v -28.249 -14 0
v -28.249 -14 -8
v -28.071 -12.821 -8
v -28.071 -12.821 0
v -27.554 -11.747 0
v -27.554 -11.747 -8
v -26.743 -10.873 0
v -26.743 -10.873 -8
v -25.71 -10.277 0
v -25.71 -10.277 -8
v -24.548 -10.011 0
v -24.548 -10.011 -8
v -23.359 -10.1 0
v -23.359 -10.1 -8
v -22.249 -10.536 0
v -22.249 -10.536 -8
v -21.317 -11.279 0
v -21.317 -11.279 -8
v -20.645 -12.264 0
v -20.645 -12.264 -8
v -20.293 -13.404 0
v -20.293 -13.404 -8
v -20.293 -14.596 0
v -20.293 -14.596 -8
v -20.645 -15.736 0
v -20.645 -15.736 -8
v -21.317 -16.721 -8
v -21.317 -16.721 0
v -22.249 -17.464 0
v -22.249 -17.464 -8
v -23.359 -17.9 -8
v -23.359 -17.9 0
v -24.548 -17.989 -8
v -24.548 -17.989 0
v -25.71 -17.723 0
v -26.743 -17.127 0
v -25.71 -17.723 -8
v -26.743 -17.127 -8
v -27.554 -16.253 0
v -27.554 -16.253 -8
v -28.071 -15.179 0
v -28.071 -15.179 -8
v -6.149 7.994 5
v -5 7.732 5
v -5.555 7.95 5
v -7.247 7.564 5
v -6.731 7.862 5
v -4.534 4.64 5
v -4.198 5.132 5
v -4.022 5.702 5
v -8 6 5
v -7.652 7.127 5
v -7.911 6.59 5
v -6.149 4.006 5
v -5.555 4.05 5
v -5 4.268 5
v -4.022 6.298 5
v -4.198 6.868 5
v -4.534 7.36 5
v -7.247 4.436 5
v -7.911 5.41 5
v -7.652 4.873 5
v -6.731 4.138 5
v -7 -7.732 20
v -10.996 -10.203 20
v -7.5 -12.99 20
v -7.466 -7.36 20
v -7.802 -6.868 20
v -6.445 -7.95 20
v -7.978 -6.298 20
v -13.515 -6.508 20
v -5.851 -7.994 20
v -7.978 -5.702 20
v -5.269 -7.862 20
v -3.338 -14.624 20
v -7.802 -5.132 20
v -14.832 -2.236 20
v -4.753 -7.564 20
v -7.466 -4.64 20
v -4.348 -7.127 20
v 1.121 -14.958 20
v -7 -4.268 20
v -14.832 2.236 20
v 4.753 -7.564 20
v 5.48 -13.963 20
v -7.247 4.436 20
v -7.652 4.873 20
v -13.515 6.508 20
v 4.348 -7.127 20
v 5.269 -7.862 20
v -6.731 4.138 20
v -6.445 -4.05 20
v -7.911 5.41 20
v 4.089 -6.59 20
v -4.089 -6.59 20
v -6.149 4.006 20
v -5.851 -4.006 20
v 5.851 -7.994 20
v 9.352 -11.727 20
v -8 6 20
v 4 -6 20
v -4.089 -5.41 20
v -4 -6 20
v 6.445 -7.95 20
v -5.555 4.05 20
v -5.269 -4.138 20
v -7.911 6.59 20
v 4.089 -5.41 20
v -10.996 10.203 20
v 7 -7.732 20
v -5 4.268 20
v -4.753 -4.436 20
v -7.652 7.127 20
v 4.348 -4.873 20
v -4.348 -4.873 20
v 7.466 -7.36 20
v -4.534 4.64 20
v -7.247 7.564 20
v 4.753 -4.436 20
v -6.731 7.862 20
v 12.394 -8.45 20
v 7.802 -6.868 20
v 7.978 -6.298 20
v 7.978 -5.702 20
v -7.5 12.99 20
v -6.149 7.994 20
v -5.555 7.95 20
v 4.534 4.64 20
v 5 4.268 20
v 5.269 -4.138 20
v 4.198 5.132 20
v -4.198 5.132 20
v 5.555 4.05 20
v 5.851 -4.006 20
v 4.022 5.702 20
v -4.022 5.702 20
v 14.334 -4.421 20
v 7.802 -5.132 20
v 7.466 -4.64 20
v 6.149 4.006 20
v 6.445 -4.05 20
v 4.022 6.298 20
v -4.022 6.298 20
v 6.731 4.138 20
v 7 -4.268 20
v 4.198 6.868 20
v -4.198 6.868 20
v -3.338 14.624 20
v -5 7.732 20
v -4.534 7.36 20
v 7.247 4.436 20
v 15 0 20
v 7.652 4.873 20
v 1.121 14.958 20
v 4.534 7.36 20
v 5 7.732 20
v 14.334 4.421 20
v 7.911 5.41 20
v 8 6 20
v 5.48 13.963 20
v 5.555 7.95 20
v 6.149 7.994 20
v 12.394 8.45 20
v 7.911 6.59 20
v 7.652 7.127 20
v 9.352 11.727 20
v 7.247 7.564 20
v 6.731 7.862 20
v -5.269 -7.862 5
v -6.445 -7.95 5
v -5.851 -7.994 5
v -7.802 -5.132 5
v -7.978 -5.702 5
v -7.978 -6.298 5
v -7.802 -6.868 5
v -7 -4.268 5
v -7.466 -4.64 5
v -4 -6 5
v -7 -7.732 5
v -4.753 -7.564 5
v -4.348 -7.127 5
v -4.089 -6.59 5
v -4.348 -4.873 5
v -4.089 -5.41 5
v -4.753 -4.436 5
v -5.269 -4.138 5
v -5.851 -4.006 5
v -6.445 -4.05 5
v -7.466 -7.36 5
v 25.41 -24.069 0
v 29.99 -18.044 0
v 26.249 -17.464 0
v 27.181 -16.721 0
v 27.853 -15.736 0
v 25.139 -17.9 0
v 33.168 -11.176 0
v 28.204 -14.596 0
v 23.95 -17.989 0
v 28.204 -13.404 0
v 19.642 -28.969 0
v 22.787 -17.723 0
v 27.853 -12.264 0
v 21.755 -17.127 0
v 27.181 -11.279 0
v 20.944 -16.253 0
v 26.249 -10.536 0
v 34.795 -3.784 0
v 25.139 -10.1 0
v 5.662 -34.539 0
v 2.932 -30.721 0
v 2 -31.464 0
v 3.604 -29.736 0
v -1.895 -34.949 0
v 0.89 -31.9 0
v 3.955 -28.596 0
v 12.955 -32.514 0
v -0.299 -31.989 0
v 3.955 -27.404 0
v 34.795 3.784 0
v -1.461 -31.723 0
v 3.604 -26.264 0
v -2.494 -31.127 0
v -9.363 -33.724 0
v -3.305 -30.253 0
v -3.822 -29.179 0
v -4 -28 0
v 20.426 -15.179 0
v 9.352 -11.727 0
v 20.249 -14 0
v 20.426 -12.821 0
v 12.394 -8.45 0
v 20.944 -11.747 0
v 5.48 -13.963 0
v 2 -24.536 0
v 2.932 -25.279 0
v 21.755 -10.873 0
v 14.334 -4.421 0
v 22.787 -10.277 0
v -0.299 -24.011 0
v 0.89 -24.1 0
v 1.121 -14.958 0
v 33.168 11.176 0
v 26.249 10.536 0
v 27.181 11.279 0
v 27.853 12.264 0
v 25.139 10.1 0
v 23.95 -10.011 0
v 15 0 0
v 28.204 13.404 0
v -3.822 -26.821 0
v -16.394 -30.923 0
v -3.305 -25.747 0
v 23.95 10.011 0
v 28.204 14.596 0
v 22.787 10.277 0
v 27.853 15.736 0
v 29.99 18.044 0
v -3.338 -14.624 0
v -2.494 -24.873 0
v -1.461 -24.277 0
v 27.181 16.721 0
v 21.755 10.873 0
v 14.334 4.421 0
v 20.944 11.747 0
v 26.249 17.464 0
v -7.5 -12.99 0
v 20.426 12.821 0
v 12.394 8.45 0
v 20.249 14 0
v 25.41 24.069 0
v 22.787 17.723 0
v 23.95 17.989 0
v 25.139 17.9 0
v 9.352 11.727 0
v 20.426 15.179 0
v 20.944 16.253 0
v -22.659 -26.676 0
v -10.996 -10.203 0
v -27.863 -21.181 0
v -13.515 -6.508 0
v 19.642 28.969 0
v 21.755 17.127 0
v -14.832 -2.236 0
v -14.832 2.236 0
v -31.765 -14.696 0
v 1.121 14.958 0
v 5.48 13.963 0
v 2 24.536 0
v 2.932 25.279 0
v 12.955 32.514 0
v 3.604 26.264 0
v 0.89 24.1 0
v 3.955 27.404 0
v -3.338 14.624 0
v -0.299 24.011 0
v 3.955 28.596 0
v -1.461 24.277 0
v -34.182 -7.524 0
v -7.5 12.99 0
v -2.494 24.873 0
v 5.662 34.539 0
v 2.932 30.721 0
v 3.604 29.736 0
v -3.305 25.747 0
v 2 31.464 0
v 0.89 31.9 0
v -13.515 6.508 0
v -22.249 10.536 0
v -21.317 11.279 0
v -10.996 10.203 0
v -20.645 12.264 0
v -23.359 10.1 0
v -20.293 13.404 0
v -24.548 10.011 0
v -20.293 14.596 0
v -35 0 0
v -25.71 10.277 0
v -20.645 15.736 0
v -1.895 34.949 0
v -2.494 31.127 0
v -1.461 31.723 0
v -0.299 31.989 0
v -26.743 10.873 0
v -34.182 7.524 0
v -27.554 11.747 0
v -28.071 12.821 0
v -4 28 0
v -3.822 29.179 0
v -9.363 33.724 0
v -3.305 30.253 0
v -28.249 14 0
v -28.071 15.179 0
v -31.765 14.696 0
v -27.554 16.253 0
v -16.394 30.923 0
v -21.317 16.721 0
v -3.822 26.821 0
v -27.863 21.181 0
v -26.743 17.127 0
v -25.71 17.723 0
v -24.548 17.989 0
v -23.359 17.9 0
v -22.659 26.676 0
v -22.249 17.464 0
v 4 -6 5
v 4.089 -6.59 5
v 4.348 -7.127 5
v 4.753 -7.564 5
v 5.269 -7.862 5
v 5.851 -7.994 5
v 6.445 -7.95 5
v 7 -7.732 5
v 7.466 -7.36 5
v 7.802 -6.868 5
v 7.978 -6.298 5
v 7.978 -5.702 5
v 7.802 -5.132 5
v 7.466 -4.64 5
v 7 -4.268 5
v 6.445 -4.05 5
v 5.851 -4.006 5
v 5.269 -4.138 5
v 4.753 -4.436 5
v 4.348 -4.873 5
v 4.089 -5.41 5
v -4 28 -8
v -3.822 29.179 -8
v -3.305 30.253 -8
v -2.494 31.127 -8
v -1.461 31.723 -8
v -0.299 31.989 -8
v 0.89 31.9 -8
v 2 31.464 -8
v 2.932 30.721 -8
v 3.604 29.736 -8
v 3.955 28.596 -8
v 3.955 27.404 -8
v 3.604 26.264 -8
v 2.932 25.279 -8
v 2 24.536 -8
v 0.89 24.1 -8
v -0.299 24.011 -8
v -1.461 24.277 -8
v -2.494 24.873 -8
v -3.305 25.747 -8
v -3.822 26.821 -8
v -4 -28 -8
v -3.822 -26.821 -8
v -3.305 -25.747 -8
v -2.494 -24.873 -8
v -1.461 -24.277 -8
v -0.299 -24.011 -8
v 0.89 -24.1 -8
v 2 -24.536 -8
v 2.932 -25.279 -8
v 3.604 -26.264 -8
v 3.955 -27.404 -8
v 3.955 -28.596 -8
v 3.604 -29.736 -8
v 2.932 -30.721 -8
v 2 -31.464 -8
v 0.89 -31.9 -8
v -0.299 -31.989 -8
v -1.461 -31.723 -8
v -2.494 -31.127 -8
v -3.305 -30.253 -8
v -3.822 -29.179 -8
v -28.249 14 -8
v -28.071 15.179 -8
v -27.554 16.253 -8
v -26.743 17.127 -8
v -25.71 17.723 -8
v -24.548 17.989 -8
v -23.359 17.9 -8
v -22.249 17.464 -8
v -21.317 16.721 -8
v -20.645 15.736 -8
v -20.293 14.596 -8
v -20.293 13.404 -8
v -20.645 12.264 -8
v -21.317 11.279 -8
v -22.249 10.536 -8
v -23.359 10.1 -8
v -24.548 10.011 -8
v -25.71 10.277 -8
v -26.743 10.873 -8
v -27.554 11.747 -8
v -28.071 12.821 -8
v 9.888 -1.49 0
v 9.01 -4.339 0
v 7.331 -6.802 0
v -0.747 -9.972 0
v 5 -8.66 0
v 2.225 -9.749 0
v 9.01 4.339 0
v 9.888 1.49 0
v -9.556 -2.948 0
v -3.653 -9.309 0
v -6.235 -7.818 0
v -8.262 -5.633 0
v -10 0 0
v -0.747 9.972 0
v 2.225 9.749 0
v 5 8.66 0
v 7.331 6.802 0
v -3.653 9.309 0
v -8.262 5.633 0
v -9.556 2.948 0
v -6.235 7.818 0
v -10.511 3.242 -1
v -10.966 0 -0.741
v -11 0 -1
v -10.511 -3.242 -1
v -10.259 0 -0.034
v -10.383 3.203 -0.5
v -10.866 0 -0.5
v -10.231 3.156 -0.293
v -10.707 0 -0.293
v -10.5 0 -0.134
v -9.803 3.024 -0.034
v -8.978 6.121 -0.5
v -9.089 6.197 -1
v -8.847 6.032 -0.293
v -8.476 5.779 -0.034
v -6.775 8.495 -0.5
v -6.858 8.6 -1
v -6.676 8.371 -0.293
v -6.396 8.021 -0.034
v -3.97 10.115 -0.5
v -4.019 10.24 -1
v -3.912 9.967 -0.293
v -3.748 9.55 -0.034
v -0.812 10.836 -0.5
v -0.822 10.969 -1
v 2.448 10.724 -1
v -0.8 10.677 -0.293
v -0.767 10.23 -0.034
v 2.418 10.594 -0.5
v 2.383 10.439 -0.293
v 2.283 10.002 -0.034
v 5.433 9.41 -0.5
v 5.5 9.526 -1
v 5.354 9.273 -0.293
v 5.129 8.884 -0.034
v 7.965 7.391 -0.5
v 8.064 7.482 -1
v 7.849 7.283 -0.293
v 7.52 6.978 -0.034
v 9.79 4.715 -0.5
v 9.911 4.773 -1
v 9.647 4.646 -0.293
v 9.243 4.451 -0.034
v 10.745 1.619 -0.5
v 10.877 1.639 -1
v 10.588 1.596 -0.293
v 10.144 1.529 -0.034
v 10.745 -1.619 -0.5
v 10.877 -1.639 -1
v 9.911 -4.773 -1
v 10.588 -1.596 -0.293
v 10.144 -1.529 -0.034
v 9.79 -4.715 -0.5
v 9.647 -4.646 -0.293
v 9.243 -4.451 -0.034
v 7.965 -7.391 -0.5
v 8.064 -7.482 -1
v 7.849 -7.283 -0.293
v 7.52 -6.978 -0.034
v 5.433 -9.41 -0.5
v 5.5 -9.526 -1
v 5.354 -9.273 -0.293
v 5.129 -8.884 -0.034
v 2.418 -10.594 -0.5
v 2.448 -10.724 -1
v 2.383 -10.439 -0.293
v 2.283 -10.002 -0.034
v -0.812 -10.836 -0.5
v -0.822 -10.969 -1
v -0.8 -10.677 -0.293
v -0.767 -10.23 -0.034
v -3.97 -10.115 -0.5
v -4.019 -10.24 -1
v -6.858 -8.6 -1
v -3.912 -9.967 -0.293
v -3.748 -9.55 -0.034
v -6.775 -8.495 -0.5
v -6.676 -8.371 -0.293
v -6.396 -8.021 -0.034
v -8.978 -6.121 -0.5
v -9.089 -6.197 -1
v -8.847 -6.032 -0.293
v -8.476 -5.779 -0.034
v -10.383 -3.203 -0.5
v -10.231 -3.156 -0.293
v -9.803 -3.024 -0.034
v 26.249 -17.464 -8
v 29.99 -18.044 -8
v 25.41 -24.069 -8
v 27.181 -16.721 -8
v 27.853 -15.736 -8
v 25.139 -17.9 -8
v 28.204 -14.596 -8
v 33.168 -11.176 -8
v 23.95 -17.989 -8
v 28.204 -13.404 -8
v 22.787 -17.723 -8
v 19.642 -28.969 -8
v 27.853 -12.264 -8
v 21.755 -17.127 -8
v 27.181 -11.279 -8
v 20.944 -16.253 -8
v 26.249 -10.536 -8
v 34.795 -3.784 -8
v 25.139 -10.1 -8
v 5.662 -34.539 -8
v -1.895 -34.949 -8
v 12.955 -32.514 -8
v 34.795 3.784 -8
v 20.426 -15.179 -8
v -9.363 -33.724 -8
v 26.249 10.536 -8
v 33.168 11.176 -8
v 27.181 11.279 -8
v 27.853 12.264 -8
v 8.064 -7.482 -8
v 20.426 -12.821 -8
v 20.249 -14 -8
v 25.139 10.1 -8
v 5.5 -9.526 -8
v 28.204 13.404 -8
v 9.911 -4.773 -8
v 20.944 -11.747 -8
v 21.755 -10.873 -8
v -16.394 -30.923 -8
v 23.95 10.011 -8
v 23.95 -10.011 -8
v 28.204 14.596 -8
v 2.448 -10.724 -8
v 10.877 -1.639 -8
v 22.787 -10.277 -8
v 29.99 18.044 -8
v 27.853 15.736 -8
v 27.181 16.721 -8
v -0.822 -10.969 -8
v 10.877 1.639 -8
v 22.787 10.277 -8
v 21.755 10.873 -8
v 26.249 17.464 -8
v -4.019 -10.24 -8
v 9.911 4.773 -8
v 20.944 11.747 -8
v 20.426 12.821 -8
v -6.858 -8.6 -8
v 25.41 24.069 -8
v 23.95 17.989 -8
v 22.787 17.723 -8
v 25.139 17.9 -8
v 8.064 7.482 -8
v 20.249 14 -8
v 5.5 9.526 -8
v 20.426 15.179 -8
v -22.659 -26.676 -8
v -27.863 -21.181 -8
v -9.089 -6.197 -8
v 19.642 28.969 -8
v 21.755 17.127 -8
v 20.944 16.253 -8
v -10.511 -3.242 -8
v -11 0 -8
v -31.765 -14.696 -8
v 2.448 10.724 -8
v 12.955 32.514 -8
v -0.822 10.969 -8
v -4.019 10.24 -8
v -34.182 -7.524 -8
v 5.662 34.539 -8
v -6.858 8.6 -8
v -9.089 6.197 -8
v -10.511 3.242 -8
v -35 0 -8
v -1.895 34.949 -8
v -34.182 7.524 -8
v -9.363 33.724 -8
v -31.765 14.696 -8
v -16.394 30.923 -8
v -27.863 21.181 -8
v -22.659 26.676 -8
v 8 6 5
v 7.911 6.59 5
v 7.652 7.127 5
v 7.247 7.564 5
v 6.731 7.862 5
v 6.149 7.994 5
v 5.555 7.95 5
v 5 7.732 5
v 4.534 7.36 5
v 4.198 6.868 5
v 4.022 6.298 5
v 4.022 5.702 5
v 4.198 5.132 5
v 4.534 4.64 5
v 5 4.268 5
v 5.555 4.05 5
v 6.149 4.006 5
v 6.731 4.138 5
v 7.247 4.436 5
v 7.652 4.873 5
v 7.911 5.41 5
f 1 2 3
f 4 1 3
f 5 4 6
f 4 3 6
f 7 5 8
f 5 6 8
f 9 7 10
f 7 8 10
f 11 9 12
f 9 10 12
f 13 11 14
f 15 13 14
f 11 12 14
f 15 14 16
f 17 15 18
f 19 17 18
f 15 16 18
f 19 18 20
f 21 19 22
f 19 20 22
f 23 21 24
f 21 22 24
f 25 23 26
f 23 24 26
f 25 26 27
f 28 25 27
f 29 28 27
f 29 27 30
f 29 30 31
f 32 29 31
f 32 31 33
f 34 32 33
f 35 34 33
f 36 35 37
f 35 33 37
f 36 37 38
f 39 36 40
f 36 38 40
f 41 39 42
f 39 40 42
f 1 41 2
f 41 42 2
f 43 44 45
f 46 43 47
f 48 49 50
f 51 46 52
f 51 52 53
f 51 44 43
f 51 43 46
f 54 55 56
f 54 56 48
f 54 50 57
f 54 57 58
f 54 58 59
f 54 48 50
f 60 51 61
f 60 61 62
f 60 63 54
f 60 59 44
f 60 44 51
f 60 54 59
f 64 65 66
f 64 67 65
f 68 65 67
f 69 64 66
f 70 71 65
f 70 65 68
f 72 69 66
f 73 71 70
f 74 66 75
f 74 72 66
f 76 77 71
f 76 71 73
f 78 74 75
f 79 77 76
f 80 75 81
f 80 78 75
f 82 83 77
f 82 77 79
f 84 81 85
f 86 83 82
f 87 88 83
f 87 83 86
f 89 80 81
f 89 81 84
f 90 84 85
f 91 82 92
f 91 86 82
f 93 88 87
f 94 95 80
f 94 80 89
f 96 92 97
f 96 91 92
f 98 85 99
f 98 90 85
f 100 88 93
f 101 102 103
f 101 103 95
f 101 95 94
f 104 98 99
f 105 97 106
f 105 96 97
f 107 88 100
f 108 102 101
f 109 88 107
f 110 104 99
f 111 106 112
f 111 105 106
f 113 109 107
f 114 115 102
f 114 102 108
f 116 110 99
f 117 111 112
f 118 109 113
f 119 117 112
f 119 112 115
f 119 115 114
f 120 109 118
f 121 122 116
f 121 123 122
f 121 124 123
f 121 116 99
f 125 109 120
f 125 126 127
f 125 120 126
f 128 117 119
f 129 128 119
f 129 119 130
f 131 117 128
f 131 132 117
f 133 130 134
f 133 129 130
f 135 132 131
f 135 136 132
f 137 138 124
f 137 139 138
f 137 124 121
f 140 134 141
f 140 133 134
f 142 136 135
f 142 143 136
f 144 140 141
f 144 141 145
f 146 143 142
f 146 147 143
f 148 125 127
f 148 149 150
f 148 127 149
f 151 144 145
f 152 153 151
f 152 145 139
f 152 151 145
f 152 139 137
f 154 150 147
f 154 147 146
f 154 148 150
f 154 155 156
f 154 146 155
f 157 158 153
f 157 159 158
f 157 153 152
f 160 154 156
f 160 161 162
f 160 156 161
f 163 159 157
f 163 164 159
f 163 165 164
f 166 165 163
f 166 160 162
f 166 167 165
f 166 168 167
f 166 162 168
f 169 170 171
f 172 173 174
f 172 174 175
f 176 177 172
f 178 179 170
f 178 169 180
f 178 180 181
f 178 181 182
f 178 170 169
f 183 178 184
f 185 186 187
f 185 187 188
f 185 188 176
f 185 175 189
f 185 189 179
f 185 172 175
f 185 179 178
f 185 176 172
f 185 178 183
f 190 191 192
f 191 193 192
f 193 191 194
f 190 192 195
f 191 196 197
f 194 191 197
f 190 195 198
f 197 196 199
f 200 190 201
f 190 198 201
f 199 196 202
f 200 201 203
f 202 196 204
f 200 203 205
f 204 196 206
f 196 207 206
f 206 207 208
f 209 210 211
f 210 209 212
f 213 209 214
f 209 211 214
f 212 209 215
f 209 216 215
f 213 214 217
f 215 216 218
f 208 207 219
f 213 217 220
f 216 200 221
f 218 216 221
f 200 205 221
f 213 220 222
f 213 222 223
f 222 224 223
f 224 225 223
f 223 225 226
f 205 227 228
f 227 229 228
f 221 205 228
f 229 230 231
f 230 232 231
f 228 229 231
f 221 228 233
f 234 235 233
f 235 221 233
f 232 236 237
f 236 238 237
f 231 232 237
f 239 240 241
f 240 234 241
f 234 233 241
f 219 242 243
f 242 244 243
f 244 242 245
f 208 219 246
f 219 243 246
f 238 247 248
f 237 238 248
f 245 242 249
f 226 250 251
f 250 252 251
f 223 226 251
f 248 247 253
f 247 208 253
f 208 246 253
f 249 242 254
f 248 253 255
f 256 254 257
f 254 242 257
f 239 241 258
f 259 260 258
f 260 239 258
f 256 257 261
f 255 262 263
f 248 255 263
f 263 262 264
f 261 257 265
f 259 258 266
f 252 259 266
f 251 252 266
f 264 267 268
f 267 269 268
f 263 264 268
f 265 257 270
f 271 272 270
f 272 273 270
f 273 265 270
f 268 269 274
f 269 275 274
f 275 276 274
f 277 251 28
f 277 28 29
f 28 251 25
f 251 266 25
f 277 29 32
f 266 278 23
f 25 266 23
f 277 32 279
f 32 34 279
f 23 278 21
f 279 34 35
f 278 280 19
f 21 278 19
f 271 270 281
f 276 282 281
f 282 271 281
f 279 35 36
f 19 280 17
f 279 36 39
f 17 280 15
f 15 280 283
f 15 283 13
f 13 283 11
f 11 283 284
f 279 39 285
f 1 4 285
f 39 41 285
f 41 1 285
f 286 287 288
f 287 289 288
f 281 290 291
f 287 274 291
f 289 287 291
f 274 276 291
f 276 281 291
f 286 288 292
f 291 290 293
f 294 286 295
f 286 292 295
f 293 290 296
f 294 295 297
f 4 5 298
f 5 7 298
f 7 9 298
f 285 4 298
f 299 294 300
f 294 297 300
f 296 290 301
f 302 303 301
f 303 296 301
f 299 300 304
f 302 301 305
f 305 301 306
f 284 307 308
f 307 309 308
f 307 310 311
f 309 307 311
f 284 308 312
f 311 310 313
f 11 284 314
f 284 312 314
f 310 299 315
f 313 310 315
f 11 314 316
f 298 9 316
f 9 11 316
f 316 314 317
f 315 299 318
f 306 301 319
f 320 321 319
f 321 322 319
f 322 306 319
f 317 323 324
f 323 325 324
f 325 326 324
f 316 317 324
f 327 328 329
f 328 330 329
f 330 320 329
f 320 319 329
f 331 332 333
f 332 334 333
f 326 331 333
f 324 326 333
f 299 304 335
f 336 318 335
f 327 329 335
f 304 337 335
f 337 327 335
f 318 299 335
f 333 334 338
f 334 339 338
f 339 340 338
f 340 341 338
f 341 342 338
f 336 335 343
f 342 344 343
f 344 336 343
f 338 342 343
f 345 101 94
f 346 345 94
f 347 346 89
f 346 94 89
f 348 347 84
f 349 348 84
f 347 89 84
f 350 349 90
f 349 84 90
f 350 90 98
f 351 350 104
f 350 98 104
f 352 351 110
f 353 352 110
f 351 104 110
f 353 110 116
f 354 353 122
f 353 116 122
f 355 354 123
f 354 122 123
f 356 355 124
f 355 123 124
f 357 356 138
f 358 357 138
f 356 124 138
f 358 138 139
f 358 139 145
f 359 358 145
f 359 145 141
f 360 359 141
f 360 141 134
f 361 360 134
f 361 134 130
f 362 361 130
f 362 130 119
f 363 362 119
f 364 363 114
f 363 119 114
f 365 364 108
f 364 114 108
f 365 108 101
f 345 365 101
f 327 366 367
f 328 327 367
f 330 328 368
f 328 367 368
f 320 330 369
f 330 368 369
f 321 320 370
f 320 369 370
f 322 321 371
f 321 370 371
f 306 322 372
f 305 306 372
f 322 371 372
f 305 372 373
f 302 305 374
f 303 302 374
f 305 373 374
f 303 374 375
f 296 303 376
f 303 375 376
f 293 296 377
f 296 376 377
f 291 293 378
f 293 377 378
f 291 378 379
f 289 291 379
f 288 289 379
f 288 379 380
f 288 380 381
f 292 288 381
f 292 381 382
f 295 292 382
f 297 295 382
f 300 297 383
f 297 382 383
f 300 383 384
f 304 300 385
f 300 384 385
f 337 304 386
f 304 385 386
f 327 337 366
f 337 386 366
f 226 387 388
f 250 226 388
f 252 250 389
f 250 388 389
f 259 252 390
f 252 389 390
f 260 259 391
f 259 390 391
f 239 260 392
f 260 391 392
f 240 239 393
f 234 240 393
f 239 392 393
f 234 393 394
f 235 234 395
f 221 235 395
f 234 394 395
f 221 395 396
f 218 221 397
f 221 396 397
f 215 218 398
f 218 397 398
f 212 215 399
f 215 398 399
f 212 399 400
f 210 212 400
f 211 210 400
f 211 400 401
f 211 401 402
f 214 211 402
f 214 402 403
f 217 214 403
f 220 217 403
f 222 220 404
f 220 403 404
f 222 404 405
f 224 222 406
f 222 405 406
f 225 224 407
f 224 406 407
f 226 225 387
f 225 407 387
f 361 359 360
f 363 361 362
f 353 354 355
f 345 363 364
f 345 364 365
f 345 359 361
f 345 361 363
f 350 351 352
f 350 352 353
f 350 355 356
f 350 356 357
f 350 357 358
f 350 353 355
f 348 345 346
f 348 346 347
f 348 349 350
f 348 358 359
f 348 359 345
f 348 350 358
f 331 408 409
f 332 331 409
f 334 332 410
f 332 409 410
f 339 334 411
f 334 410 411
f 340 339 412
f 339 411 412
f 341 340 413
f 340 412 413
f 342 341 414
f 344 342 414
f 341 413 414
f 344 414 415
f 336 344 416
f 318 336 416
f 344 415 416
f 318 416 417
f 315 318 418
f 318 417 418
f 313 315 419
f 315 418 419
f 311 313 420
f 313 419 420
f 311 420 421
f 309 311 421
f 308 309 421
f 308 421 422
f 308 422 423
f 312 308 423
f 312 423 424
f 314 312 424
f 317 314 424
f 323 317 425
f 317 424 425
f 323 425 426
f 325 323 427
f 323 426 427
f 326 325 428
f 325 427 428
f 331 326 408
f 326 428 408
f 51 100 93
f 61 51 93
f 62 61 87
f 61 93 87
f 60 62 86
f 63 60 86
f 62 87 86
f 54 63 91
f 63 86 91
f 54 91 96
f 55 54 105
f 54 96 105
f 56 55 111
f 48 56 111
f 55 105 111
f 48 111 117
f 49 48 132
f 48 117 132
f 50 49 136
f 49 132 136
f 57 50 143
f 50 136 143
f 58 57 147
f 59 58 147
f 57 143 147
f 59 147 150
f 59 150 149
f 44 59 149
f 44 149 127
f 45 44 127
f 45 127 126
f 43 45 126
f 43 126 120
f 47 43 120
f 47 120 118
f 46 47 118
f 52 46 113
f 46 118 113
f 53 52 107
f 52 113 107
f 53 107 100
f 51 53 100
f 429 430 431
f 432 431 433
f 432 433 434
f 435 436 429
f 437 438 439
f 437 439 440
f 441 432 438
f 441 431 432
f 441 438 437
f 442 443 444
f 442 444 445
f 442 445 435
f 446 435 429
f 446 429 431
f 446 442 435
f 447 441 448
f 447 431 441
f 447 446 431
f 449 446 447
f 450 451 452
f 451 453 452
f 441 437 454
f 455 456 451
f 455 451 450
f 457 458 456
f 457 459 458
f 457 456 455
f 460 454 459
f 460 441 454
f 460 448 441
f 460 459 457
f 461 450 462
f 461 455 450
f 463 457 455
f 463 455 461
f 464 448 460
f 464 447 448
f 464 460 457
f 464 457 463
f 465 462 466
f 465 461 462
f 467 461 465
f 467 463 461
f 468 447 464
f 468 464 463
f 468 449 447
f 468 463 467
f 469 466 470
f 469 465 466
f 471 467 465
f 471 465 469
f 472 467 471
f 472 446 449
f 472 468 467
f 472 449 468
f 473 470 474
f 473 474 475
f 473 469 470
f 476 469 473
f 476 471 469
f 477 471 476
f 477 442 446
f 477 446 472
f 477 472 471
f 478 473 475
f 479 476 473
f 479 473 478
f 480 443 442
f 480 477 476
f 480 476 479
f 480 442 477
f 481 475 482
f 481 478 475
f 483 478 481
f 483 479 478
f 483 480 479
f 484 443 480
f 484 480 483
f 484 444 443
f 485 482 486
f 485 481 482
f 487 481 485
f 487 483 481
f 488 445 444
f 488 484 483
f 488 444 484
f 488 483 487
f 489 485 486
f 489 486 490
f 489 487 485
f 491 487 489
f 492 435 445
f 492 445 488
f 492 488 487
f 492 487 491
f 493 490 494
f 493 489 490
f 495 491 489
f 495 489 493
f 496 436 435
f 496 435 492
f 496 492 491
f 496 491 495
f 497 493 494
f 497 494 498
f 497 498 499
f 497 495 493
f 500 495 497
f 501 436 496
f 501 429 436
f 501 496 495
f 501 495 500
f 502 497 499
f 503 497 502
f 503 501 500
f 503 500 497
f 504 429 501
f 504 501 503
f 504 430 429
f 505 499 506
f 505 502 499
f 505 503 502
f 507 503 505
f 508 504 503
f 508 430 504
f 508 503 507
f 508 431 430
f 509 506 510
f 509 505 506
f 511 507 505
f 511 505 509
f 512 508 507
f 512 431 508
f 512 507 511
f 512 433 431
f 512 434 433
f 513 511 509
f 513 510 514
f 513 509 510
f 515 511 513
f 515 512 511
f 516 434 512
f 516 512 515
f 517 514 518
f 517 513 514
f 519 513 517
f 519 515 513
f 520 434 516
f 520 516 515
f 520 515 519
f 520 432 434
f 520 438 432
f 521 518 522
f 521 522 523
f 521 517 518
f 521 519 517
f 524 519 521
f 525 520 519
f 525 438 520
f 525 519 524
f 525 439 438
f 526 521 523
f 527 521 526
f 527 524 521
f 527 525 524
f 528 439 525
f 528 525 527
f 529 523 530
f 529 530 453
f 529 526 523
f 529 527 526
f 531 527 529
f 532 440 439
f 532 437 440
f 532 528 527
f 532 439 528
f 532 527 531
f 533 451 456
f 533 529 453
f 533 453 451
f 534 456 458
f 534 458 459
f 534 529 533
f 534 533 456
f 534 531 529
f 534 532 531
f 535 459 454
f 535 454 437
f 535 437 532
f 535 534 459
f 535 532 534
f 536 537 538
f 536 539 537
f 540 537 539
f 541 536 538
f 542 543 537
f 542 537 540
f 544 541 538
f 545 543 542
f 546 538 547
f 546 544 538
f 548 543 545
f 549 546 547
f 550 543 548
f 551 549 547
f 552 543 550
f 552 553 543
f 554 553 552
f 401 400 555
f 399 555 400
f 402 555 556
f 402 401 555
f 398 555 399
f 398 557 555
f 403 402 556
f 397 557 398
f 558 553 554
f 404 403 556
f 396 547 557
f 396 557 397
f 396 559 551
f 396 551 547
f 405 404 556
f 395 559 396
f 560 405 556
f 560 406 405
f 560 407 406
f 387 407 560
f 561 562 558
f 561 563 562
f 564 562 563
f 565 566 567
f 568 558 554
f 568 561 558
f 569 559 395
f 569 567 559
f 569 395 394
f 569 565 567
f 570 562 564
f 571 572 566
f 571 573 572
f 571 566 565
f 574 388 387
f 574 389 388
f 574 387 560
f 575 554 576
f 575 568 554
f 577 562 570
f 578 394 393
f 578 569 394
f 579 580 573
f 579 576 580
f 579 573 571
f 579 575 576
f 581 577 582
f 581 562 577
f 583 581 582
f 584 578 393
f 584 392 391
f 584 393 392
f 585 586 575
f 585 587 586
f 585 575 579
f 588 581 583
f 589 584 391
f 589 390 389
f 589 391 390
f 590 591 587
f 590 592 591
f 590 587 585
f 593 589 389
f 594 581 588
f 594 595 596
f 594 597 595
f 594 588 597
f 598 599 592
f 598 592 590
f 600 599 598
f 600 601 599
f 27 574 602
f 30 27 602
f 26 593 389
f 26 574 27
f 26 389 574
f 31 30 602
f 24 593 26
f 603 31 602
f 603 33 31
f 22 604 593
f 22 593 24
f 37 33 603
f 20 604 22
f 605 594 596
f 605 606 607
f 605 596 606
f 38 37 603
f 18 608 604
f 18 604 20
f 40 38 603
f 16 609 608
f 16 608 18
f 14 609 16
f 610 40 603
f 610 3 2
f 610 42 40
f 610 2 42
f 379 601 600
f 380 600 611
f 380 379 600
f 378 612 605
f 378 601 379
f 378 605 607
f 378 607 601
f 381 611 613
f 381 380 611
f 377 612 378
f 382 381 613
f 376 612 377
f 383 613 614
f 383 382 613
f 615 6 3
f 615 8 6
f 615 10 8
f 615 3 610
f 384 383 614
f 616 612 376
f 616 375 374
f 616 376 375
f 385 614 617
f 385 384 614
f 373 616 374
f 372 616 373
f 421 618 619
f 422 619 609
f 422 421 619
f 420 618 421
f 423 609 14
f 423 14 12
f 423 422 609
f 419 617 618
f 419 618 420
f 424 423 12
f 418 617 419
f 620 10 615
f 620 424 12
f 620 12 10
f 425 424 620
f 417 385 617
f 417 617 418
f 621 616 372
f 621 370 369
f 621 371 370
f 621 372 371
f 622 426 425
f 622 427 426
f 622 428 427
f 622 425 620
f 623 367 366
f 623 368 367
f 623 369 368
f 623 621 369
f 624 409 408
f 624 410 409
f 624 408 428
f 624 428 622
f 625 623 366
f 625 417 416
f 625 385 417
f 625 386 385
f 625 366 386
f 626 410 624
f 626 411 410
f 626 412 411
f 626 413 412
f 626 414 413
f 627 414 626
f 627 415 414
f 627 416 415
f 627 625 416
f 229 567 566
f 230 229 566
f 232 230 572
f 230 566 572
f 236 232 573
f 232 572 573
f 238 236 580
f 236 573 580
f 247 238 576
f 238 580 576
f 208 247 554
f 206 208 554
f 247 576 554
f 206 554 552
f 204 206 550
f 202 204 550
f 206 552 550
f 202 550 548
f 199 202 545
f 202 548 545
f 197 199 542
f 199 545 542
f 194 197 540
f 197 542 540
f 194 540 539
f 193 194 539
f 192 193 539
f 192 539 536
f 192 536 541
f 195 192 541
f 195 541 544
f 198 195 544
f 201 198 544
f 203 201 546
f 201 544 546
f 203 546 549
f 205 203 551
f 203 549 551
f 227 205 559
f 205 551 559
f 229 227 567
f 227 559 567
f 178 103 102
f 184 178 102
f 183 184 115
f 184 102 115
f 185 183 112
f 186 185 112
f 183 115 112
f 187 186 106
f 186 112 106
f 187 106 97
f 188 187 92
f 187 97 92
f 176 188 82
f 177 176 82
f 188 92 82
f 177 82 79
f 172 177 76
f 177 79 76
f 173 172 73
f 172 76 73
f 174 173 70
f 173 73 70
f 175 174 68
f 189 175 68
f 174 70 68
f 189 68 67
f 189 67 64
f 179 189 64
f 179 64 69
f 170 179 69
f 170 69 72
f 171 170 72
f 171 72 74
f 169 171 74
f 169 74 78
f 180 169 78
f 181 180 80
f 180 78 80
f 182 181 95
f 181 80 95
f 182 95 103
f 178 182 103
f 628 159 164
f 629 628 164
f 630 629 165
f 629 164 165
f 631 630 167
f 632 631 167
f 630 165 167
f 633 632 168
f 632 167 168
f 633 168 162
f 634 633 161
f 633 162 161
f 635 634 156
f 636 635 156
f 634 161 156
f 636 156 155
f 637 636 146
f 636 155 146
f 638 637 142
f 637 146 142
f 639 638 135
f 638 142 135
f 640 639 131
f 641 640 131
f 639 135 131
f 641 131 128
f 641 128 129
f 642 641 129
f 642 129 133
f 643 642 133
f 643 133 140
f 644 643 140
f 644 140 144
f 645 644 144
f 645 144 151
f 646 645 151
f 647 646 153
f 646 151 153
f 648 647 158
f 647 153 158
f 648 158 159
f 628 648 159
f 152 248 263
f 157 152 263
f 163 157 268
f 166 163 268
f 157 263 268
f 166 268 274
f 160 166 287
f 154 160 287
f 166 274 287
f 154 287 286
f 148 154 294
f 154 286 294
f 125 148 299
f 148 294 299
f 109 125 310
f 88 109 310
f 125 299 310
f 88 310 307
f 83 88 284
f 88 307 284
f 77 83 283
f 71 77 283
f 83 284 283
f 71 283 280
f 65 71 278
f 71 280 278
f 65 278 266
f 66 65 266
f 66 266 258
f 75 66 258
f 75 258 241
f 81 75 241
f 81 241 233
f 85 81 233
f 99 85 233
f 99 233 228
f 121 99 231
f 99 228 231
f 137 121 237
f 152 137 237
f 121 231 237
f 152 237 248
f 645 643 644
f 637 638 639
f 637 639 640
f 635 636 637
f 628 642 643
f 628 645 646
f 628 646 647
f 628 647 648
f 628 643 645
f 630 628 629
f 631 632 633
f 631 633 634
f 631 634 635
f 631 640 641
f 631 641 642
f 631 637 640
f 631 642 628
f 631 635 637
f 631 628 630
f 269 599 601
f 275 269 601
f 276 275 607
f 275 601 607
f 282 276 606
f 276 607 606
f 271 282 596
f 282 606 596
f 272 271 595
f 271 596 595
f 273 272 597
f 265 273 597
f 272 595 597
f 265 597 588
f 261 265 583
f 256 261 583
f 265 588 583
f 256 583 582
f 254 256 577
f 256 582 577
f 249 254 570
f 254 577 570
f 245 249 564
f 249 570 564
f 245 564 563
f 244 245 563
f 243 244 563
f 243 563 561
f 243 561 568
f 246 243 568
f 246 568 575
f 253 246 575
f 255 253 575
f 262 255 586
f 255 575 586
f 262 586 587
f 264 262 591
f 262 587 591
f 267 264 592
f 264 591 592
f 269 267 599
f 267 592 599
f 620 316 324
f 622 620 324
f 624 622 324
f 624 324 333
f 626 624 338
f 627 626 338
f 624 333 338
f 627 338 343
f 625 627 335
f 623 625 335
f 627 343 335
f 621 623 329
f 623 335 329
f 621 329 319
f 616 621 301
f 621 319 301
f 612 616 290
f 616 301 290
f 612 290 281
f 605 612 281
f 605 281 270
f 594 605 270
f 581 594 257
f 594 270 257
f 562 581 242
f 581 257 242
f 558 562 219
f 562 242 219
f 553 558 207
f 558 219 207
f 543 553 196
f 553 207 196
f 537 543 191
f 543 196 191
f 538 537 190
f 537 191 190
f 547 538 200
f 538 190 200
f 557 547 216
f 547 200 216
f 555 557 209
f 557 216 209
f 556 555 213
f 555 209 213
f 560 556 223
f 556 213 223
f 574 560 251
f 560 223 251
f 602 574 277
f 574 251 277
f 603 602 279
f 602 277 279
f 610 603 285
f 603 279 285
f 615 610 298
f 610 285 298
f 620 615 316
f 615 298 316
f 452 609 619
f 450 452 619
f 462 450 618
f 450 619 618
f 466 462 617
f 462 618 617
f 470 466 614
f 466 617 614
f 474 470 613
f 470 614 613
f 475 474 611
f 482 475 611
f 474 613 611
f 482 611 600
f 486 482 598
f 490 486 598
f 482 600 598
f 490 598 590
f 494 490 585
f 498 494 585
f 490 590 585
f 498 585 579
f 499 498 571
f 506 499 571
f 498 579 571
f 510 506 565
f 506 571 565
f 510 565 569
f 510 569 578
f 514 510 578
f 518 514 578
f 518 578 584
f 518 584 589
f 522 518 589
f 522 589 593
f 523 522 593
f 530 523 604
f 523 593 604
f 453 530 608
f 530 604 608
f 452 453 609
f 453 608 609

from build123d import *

# Parameters (mm, degrees)
SKETCH1_R           = 15
BOSS_EXTRUDE1_DEPTH = 20
SKETCH3_R           = 35
BOSS_EXTRUDE3_DEPTH = 8
SKETCH4_R           = 4
CUT_EXTRUDE1_DEPTH  = 8
SKETCH5_R           = 11
CUT_EXTRUDE2_DEPTH  = 8
SKETCH6_R           = 2
CUT_EXTRUDE3_DEPTH  = 15
FILLET1_R           = 1


with BuildPart() as part:
    # Sketch1 → Boss-Extrude1 (new body)
    with BuildSketch(Plane.XY):
        Circle(SKETCH1_R)
    extrude(amount=BOSS_EXTRUDE1_DEPTH)

    # Sketch3 → Boss-Extrude3 (add)
    with BuildSketch(Plane(origin=(0, 0, 0), x_dir=(-1, 0, 0), z_dir=(0, 0, -1))):
        Circle(SKETCH3_R)
    extrude(amount=BOSS_EXTRUDE3_DEPTH)

    # Sketch4 → Cut-Extrude1 (cut)
    with BuildSketch(Plane(origin=(0, 0, -8), x_dir=(-1, 0, 0), z_dir=(0, 0, -1))):
        with Locations((0, 28)):
            Circle(SKETCH4_R)
        with Locations((24.248711306, 14)):
            Circle(SKETCH4_R)
        with Locations((24.248711306, -14)):
            Circle(SKETCH4_R)
        with Locations((0, -28)):
            Circle(SKETCH4_R)
        with Locations((-24.248711306, -14)):
            Circle(SKETCH4_R)
        with Locations((-24.248711306, 14)):
            Circle(SKETCH4_R)
    extrude(amount=-CUT_EXTRUDE1_DEPTH, mode=Mode.SUBTRACT)

    # Sketch5 → Cut-Extrude2 (cut)
    with BuildSketch(Plane(origin=(0, 0, -8), x_dir=(-1, 0, 0), z_dir=(0, 0, -1))):
        Circle(SKETCH5_R)
    extrude(amount=-CUT_EXTRUDE2_DEPTH, mode=Mode.SUBTRACT)

    # Sketch6 → Cut-Extrude3 (cut)
    with BuildSketch(Plane.XY.offset(20)):
        with Locations((6, 6)):
            Circle(SKETCH6_R)
        with Locations(Location((-6, 6, 0), (0, 0, 180))):
            Circle(SKETCH6_R)
        with Locations(Location((6, -6, 0), (0, 0, 180))):
            Circle(SKETCH6_R)
        with Locations((-6, -6)):
            Circle(SKETCH6_R)
    extrude(amount=-CUT_EXTRUDE3_DEPTH, mode=Mode.SUBTRACT)

    # Fillet1
    fillet1_edges = [part.edges().sort_by_distance(p)[0] for p in [
        (11, 0, 0),
    ]]
    fillet(fillet1_edges, radius=FILLET1_R)


solid = part.part
